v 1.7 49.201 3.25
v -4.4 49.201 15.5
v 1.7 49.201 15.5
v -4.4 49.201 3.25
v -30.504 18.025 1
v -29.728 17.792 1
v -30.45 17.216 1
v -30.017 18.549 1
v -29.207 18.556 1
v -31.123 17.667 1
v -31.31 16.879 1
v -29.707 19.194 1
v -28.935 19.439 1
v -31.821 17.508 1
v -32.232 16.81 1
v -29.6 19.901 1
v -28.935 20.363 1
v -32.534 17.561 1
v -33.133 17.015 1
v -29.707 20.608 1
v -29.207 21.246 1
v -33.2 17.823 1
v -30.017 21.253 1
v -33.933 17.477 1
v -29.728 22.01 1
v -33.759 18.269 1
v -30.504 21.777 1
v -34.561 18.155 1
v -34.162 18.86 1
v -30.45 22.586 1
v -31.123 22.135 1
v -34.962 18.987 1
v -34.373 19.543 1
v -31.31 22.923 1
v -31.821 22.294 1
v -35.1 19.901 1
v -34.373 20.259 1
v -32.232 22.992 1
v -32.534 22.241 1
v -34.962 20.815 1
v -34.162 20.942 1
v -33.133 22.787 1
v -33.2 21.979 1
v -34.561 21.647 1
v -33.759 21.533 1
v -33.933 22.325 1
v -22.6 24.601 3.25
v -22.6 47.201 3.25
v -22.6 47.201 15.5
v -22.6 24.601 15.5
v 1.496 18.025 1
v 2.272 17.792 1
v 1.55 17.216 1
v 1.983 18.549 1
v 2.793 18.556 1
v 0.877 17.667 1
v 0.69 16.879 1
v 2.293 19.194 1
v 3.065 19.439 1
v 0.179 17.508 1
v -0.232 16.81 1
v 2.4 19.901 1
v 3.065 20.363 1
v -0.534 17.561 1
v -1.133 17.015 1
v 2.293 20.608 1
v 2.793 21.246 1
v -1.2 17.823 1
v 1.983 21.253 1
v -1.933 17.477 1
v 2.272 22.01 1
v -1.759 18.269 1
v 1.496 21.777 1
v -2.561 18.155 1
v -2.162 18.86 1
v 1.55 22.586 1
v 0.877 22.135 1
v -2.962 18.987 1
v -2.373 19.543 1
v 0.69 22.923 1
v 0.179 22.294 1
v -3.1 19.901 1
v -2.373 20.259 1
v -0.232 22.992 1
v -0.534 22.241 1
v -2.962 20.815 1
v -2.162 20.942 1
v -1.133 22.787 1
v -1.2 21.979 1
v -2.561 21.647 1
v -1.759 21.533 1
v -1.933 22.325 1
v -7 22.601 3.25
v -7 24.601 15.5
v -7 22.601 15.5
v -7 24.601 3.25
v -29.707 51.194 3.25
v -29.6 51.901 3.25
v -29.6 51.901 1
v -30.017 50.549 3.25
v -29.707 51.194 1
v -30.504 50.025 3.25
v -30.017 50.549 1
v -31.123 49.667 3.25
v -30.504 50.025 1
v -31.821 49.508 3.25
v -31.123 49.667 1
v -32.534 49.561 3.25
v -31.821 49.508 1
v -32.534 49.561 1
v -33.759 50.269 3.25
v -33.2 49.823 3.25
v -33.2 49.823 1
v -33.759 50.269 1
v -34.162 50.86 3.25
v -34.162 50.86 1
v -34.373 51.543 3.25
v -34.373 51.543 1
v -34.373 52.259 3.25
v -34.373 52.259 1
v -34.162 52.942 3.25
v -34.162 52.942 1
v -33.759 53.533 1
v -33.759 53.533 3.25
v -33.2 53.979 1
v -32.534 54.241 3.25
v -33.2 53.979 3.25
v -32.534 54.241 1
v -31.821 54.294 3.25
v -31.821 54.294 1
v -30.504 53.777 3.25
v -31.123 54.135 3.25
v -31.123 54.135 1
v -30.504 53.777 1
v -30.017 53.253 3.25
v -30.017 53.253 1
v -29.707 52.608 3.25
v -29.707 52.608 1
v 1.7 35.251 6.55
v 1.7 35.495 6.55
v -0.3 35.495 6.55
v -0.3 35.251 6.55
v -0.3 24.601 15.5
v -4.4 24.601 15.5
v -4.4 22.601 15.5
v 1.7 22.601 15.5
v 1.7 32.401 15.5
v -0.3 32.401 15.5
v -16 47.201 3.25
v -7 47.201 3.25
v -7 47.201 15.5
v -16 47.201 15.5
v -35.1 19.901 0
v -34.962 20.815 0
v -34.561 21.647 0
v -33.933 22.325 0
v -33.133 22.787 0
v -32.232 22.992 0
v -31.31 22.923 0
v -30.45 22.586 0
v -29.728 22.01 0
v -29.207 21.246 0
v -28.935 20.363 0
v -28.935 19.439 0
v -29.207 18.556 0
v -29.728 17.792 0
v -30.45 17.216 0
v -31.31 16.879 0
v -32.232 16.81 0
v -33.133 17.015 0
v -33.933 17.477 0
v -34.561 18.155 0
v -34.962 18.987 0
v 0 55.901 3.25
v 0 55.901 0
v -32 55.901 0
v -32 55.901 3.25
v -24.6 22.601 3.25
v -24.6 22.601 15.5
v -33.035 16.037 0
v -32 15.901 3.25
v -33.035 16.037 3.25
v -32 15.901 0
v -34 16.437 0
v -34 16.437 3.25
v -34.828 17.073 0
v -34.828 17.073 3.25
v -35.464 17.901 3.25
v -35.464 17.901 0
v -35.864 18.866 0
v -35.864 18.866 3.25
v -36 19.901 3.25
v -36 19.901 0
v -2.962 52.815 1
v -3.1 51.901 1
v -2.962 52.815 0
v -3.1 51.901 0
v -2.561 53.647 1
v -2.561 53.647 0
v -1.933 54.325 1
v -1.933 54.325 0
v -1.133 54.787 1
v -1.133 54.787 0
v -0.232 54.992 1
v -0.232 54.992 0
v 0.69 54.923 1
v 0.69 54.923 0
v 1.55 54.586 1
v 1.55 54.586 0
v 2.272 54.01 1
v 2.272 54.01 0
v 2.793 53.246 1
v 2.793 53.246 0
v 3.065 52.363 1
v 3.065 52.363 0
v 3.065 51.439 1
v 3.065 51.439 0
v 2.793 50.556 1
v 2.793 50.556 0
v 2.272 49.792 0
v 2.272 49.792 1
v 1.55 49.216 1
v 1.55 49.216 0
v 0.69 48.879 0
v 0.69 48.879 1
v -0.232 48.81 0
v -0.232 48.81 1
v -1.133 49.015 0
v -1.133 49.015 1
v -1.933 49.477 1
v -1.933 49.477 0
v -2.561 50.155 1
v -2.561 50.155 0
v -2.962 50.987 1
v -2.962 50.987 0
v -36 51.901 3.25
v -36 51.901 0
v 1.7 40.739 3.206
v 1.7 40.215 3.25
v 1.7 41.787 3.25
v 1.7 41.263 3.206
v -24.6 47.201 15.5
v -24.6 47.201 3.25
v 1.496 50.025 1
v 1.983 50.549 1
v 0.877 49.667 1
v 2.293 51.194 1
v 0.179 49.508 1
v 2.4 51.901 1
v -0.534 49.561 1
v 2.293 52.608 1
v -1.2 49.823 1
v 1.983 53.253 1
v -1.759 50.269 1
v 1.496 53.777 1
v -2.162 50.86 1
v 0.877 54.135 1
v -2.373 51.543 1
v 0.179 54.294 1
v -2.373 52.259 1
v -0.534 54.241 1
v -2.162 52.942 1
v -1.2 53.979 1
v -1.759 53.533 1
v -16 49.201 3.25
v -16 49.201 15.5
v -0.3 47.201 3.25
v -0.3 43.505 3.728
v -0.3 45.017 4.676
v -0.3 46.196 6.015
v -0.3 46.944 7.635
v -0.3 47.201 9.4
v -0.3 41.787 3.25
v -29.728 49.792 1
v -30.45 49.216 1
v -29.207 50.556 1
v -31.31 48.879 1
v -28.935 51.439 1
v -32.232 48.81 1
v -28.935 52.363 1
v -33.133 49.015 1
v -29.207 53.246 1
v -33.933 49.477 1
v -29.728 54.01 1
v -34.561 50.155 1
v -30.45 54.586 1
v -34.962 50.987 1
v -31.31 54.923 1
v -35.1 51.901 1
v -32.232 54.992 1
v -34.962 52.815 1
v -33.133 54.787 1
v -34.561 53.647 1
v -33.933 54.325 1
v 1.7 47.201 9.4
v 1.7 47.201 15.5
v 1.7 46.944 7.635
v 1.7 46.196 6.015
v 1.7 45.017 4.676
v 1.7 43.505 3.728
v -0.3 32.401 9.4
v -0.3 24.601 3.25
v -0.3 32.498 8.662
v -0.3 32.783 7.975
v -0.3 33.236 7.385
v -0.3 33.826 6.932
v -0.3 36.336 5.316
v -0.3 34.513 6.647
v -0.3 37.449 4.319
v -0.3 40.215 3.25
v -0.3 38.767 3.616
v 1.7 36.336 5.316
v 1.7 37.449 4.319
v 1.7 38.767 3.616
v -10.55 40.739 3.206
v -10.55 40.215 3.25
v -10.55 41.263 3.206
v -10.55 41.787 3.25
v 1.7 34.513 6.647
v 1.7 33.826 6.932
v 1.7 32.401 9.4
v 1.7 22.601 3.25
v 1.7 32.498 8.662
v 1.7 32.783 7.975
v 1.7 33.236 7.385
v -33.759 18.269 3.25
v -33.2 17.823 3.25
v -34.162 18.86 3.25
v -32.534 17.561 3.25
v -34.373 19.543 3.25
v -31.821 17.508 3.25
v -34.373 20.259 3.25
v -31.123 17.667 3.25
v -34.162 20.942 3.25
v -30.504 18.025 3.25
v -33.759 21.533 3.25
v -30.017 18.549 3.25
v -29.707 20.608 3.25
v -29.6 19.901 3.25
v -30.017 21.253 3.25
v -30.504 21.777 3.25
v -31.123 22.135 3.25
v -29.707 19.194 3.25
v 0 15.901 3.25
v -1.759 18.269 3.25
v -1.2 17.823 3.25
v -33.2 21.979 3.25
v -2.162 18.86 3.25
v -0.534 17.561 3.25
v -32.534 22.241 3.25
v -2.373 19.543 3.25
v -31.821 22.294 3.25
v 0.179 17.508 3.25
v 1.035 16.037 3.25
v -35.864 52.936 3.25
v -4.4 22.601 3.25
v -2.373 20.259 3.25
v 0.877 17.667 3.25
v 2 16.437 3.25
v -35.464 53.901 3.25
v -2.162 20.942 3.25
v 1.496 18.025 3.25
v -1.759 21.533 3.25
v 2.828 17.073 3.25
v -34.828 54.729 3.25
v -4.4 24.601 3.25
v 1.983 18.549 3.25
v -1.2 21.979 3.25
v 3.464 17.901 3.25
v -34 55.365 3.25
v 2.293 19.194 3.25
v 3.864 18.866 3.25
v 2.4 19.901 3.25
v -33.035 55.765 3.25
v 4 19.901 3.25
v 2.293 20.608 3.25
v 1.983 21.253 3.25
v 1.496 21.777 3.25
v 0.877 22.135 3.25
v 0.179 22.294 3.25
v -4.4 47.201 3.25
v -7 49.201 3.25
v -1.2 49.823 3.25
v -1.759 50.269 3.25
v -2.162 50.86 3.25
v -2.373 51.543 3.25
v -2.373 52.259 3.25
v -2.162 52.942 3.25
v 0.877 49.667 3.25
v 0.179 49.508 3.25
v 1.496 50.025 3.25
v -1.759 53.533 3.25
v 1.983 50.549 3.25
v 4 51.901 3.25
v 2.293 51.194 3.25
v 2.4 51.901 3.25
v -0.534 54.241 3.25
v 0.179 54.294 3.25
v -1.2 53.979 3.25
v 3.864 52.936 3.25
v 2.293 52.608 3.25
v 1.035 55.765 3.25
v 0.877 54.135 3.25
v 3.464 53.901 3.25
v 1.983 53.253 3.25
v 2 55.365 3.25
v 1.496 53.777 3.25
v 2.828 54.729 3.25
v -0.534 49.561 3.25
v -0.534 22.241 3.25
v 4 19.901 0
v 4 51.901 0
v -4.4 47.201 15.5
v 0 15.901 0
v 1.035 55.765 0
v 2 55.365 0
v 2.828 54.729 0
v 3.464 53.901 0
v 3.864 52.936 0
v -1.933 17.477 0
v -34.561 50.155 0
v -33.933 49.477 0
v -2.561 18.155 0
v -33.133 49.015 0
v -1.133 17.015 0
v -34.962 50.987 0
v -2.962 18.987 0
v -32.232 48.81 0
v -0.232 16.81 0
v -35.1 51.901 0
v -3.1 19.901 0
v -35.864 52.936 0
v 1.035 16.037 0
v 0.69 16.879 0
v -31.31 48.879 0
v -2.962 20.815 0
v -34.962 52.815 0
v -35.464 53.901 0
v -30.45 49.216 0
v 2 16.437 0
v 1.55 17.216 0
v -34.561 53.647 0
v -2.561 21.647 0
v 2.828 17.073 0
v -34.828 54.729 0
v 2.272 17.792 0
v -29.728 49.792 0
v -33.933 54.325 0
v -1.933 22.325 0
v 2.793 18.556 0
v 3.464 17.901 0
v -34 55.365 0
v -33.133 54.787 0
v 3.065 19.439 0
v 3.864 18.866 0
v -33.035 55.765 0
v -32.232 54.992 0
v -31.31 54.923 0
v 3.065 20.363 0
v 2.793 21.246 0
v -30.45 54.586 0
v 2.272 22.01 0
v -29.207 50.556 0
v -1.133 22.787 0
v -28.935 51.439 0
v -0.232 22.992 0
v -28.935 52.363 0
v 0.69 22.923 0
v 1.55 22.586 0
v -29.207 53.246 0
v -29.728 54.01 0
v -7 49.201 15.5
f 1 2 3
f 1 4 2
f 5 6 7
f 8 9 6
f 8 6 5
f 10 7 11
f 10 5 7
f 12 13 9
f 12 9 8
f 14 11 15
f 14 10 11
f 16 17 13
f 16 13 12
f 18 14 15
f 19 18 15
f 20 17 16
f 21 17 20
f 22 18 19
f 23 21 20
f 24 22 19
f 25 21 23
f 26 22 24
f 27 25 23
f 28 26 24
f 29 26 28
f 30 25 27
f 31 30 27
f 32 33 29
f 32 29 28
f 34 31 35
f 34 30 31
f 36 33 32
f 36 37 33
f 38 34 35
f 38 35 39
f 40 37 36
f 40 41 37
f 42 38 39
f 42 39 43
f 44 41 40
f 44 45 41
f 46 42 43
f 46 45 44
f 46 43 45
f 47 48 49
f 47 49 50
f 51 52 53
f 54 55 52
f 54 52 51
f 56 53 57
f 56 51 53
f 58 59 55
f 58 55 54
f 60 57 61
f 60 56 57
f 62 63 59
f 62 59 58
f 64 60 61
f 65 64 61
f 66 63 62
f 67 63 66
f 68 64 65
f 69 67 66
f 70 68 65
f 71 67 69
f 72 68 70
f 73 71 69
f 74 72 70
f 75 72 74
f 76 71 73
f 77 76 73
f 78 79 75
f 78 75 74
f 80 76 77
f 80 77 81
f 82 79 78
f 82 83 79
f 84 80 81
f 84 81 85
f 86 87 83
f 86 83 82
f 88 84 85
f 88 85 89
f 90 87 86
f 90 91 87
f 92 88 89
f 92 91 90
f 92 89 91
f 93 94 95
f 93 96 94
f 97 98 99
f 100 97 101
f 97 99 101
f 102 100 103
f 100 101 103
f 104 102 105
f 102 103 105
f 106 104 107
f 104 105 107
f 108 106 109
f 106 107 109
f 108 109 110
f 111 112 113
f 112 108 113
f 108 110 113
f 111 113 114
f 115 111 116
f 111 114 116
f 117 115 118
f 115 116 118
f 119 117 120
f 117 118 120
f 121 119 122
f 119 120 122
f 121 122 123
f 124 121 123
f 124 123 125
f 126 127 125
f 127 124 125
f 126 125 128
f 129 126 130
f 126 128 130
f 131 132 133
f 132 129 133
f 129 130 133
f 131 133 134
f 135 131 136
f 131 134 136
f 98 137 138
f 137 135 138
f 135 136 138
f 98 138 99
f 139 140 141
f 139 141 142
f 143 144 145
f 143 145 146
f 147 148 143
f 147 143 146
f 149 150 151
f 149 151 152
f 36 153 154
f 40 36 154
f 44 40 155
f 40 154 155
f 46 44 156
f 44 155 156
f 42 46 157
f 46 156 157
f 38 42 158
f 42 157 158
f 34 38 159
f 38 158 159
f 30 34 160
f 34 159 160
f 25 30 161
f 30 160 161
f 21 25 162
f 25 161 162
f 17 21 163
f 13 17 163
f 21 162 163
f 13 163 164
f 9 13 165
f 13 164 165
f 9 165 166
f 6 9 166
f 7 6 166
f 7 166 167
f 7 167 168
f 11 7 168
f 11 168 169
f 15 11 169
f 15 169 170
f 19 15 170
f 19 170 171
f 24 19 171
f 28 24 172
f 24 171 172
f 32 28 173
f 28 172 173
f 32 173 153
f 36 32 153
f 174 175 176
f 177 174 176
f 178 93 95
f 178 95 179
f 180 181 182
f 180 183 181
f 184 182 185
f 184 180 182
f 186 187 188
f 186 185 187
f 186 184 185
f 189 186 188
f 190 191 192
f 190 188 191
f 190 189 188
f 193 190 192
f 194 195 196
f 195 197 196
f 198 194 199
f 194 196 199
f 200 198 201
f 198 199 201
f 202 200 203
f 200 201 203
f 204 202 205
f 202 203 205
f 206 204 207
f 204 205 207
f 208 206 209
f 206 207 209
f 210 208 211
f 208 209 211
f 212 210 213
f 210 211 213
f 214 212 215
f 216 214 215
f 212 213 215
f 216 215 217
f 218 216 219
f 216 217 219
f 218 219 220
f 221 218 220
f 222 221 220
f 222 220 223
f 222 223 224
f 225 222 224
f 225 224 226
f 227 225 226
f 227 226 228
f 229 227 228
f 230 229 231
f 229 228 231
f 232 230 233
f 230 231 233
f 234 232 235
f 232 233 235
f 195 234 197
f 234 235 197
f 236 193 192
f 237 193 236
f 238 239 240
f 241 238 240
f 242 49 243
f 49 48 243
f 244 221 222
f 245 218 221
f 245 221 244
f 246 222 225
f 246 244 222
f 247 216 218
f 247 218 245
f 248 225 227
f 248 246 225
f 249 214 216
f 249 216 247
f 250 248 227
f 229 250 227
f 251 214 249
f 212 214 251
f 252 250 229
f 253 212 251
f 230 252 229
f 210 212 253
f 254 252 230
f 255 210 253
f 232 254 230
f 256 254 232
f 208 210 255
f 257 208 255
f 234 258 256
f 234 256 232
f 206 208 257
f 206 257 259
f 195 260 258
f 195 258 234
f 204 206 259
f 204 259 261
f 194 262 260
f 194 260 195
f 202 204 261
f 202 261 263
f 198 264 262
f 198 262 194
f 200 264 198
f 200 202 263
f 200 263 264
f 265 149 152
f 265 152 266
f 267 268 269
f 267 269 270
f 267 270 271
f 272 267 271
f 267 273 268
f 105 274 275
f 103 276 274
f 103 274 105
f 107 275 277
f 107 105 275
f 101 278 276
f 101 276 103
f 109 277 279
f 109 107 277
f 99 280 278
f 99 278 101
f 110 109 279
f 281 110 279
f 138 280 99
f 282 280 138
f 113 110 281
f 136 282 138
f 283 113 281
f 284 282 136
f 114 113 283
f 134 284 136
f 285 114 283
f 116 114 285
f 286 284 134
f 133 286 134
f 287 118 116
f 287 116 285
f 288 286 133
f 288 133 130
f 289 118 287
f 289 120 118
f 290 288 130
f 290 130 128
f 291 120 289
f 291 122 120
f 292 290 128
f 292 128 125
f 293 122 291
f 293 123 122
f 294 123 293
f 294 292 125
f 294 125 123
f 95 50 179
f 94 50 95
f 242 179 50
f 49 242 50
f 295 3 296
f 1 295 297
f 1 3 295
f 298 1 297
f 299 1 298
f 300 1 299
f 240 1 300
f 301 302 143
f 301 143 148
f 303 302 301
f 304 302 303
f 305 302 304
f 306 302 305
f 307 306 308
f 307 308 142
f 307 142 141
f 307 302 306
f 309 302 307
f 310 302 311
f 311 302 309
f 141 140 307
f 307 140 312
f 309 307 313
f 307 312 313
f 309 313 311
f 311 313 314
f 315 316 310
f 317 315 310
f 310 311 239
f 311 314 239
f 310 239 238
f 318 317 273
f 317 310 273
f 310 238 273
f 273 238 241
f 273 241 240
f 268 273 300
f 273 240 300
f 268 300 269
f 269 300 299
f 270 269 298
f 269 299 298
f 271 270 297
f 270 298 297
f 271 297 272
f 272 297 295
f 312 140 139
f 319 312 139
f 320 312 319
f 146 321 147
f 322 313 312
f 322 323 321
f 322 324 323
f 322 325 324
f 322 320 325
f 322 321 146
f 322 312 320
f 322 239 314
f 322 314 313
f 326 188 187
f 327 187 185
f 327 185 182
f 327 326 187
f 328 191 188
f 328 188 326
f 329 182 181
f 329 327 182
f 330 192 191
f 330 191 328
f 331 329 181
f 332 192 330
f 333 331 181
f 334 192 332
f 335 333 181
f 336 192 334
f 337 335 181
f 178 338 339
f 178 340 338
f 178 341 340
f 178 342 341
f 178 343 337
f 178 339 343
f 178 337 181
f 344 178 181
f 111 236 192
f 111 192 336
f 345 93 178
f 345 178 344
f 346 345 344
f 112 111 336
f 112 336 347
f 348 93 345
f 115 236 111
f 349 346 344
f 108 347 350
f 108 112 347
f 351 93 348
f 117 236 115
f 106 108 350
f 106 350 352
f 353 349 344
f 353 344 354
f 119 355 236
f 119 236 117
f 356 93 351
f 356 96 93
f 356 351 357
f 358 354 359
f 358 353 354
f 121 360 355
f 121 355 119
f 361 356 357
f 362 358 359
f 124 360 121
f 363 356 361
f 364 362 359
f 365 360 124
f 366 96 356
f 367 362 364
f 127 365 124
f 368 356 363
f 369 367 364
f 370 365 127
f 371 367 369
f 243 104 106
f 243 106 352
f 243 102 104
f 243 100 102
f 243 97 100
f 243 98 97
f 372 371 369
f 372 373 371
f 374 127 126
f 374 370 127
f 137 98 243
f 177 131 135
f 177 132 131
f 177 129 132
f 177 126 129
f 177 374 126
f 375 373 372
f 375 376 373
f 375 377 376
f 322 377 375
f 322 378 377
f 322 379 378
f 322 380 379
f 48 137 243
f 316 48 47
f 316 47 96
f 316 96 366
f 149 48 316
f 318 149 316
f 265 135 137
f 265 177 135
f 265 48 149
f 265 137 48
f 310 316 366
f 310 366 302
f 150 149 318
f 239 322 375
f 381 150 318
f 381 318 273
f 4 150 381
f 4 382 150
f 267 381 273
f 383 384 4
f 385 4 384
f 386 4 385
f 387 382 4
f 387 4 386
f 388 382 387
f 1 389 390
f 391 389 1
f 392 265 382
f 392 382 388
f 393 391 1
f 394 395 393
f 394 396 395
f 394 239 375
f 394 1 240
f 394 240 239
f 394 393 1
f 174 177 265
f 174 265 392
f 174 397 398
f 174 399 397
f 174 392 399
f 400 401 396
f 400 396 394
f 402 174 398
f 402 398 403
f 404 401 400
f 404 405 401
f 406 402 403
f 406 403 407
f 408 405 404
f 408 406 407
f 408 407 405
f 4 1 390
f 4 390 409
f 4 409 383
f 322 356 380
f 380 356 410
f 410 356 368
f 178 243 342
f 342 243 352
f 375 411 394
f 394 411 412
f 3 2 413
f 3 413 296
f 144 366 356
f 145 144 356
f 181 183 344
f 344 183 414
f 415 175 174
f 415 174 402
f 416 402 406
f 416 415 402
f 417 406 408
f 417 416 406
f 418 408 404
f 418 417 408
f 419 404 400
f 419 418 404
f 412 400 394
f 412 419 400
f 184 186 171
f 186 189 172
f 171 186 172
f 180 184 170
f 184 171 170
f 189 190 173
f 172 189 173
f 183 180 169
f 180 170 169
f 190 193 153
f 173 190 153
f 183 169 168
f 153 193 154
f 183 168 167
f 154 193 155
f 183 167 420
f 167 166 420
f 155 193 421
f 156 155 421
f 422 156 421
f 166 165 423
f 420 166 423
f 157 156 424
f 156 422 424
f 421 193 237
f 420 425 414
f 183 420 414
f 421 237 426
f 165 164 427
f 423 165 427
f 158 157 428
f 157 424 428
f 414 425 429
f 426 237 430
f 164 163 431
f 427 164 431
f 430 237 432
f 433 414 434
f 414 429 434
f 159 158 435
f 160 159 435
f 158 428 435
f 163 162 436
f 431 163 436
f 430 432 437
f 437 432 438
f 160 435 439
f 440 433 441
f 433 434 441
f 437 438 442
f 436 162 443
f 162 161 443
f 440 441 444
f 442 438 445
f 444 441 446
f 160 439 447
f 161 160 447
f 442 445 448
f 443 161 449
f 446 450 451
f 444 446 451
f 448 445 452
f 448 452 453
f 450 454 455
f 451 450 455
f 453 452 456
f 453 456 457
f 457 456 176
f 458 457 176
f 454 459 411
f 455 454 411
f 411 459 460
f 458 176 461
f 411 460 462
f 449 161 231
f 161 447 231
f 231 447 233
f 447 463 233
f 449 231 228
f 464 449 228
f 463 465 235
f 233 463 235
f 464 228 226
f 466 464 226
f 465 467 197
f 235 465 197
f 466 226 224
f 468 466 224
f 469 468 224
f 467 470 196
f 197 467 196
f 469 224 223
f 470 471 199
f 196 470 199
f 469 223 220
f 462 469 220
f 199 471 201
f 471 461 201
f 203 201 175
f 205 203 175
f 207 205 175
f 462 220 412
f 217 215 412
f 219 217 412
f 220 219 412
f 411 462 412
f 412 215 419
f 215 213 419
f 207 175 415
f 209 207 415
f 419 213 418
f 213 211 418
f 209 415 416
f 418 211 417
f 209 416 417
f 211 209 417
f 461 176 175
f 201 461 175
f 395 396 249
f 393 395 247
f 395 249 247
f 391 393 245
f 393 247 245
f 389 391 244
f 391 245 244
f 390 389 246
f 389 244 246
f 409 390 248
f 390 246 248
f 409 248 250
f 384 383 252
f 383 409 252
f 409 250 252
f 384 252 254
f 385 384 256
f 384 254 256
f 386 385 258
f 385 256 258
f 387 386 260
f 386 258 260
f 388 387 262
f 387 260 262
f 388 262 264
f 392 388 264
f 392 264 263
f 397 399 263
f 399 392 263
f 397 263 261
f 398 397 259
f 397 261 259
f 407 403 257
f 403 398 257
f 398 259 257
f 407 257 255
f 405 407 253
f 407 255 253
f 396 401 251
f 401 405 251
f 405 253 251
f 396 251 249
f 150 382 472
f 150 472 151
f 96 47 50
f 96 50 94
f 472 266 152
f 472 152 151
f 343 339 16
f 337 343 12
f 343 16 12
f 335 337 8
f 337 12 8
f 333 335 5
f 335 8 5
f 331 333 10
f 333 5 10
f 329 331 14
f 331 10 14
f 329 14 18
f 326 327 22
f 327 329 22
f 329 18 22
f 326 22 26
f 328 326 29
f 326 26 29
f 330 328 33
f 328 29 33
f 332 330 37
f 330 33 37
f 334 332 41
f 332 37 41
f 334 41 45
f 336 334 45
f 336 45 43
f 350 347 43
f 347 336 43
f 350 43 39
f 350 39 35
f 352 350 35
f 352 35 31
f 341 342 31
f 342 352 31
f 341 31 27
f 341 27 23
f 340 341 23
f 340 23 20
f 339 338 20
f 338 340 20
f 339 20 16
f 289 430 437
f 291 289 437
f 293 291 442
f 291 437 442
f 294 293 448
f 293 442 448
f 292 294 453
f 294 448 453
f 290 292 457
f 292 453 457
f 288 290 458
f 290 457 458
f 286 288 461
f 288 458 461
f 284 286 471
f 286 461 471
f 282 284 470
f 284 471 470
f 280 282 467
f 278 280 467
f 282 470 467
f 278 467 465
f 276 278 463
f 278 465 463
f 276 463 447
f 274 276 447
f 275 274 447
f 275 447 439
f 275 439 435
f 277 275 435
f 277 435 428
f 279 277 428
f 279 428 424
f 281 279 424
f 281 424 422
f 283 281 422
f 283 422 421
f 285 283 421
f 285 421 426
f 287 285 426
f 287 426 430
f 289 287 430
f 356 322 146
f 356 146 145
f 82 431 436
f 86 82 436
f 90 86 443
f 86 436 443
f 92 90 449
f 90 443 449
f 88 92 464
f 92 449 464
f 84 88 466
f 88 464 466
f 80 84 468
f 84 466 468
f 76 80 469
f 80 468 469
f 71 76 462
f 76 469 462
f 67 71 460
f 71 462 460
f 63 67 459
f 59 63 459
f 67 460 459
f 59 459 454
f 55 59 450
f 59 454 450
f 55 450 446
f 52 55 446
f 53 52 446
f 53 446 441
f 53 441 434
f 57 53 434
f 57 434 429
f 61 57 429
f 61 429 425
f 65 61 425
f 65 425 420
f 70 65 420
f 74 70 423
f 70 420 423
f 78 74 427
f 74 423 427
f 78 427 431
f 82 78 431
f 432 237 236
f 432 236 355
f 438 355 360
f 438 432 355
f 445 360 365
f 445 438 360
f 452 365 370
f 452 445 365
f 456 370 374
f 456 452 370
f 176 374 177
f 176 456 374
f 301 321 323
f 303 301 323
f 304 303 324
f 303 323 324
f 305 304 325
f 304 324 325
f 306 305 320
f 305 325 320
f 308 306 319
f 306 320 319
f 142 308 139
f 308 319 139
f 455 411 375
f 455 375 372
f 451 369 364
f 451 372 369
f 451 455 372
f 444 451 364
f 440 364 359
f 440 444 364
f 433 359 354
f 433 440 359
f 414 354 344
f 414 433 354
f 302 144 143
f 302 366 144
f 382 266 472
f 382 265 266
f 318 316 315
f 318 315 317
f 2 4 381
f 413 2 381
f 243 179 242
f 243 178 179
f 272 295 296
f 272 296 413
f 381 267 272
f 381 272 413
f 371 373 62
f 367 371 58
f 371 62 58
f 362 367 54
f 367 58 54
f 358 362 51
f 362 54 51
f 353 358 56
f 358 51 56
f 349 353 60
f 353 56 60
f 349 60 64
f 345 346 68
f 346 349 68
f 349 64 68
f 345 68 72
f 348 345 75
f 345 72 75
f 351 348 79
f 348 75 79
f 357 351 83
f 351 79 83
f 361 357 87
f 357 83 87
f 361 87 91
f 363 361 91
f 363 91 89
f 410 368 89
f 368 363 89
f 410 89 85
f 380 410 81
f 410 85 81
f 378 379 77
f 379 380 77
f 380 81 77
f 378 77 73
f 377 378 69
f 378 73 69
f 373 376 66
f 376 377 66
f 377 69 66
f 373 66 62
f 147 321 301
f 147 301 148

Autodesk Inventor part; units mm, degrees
ref_plane "YZ Plane" through (0, 0, 0) normal (1, 0, 0) x (0, 1, 0)
ref_plane "XZ Plane" through (0, 0, 0) normal (0, 1, 0) x (-1, 0, 0)
ref_plane "XY Plane" through (0, 0, 0) normal (0, 0, 1) x (1, 0, 0)
sketch "Esboço1" plane through (0, 0, 0) normal (0, 0, 1) x (1, 0, 0)
  circle A0 centre (0, 51.901) radius 2.4 projected
  circle A1 centre (0, 19.901) radius 2.4 projected
  circle A2 centre (-32, 19.901) radius 2.4 projected
  line L0 (-36, 3.901) -> (-36, 51.901) projected
  circle A3 centre (0, 19.901) radius 4
  circle A4 centre (0, 51.901) radius 4
  circle A5 centre (-32, 19.901) radius 4
  line L1 (-36, 15.901) -> (0, 15.901)
  line L2 (4, 19.901) -> (4, 51.901)
  line L3 (0, 55.901) -> (-36, 55.901)
  line L4 (-36, 55.901) -> (-36, 15.901)
  circle A6 centre (-32, 51.901) radius 4
  circle A7 centre (-32, 51.901) radius 2.4 projected
  point P0 (0, 0)
  point P1 (-36, 19.901)
  point P2 (-32, 15.901)
  point P3 (-32, 55.901)
  dimension "d0" = 8
  dimension "d1" = 8
  dimension "d2" = 8
  dimension "d12" = 8
extrude "Extrusão1" add sketch "Esboço1" along normal blind 3.25 contours L0 A6 L3 A4 L2 A3 L1 A5 | A5 | A6 | A3 | A4
sketch "Esboço2" plane through (0, 0, 3.25) normal (0, 0, 1) x (1, 0, 0)
  arc A0 (-22.6, 24.751) -> (-22.45, 24.601) centre (-22.45, 24.751) ccw projected
  line L0 (-0.3, 39.0723) -> (-0.3, 24.751) projected
  line L1 (-4.4, 47.201) -> (-0.45, 47.201) projected
  line L2 (-0.3, 24.601) -> (-0.3, 47.201)
  line L3 (-22.6, 47.201) -> (-22.6, 24.601)
  line L4 (1.7, 49.201) -> (1.7, 22.601)
  line L5 (-24.6, 22.601) -> (-24.6, 47.201)
  line L6 (-22.6, 47.201) -> (-24.6, 47.201)
  line L7 (-7, 49.201) -> (-7, 47.201)
  line L8 (-4.4, 49.201) -> (-4.4, 47.201)
  line L9 (-4.4, 24.601) -> (-4.4, 22.601)
  line L10 (-7, 24.601) -> (-7, 22.601)
  line L11 (-22.6, 24.601) -> (-7, 24.601)
  line L12 (-4.4, 24.601) -> (-0.3, 24.601)
  line L13 (1.7, 22.601) -> (-4.4, 22.601)
  line L14 (-7, 22.601) -> (-24.6, 22.601)
  line L15 (-16, 49.201) -> (-7, 49.201)
  line L16 (-4.4, 49.201) -> (1.7, 49.201)
  line L17 (-0.3, 47.201) -> (-4.4, 47.201)
  line L18 (-7, 47.201) -> (-16, 47.201)
  line L19 (-16, 47.201) -> (-16, 49.201)
  point P0 (0, 0)
extrude "Extrusão2" add sketch "Esboço2" along normal blind 12.25 contours L3 L11 L10 L14 L5 L6 | L2 L17 L1 L8 L16 L4 L13 L9 L12 L0 | L7 L18 L19 L15
sketch "Esboço3" plane through (1.7, 22.601, 3.25) normal (1, 0, 0) x (0, 0, -1)
  arc A0 (-6.15, 9.8) -> (-3.3, 12.65) centre (-6.15, 12.65) ccw
  line L0 (-3.3, 12.8939) -> (-3.3, 12.65)
  line L1 (-6.15, 9.8) -> (-12.25, 9.8)
  line L2 (-12.25, 24.6) -> (-12.25, 0) projected
  line L3 (0, 24.6) -> (-12.25, 24.6) projected
  line L4 (-6.15, 24.6) -> (-12.25, 24.6)
  arc A1 (-3.3, 12.8939) -> (-6.15, 24.6) centre (-6.15, 18.4) ccw
  point P0 (3.25, -22.601)
extrude "Extrusão3" cut sketch "Esboço3" against normal blind 12.25
sketch "Esboço4" plane through (0, 0, 0) normal (0, 0, -1) x (-1, 0, 0)
  circle A0 centre (0, 19.901) radius 2.4 projected
  circle A1 centre (32, 19.901) radius 2.4 projected
  circle A2 centre (0, 51.901) radius 2.4 projected
  circle A3 centre (32, 51.901) radius 2.4 projected
  circle A4 centre (32, 51.901) radius 3.1 projected
  circle A5 centre (0, 51.901) radius 3.1 projected
  circle A6 centre (0, 19.901) radius 3.1 projected
  circle A7 centre (32, 19.901) radius 3.1 projected
  point P0 (0, 0)
extrude "Extrusão4" cut sketch "Esboço4" against normal blind 1
properties part number "apoio servo"
